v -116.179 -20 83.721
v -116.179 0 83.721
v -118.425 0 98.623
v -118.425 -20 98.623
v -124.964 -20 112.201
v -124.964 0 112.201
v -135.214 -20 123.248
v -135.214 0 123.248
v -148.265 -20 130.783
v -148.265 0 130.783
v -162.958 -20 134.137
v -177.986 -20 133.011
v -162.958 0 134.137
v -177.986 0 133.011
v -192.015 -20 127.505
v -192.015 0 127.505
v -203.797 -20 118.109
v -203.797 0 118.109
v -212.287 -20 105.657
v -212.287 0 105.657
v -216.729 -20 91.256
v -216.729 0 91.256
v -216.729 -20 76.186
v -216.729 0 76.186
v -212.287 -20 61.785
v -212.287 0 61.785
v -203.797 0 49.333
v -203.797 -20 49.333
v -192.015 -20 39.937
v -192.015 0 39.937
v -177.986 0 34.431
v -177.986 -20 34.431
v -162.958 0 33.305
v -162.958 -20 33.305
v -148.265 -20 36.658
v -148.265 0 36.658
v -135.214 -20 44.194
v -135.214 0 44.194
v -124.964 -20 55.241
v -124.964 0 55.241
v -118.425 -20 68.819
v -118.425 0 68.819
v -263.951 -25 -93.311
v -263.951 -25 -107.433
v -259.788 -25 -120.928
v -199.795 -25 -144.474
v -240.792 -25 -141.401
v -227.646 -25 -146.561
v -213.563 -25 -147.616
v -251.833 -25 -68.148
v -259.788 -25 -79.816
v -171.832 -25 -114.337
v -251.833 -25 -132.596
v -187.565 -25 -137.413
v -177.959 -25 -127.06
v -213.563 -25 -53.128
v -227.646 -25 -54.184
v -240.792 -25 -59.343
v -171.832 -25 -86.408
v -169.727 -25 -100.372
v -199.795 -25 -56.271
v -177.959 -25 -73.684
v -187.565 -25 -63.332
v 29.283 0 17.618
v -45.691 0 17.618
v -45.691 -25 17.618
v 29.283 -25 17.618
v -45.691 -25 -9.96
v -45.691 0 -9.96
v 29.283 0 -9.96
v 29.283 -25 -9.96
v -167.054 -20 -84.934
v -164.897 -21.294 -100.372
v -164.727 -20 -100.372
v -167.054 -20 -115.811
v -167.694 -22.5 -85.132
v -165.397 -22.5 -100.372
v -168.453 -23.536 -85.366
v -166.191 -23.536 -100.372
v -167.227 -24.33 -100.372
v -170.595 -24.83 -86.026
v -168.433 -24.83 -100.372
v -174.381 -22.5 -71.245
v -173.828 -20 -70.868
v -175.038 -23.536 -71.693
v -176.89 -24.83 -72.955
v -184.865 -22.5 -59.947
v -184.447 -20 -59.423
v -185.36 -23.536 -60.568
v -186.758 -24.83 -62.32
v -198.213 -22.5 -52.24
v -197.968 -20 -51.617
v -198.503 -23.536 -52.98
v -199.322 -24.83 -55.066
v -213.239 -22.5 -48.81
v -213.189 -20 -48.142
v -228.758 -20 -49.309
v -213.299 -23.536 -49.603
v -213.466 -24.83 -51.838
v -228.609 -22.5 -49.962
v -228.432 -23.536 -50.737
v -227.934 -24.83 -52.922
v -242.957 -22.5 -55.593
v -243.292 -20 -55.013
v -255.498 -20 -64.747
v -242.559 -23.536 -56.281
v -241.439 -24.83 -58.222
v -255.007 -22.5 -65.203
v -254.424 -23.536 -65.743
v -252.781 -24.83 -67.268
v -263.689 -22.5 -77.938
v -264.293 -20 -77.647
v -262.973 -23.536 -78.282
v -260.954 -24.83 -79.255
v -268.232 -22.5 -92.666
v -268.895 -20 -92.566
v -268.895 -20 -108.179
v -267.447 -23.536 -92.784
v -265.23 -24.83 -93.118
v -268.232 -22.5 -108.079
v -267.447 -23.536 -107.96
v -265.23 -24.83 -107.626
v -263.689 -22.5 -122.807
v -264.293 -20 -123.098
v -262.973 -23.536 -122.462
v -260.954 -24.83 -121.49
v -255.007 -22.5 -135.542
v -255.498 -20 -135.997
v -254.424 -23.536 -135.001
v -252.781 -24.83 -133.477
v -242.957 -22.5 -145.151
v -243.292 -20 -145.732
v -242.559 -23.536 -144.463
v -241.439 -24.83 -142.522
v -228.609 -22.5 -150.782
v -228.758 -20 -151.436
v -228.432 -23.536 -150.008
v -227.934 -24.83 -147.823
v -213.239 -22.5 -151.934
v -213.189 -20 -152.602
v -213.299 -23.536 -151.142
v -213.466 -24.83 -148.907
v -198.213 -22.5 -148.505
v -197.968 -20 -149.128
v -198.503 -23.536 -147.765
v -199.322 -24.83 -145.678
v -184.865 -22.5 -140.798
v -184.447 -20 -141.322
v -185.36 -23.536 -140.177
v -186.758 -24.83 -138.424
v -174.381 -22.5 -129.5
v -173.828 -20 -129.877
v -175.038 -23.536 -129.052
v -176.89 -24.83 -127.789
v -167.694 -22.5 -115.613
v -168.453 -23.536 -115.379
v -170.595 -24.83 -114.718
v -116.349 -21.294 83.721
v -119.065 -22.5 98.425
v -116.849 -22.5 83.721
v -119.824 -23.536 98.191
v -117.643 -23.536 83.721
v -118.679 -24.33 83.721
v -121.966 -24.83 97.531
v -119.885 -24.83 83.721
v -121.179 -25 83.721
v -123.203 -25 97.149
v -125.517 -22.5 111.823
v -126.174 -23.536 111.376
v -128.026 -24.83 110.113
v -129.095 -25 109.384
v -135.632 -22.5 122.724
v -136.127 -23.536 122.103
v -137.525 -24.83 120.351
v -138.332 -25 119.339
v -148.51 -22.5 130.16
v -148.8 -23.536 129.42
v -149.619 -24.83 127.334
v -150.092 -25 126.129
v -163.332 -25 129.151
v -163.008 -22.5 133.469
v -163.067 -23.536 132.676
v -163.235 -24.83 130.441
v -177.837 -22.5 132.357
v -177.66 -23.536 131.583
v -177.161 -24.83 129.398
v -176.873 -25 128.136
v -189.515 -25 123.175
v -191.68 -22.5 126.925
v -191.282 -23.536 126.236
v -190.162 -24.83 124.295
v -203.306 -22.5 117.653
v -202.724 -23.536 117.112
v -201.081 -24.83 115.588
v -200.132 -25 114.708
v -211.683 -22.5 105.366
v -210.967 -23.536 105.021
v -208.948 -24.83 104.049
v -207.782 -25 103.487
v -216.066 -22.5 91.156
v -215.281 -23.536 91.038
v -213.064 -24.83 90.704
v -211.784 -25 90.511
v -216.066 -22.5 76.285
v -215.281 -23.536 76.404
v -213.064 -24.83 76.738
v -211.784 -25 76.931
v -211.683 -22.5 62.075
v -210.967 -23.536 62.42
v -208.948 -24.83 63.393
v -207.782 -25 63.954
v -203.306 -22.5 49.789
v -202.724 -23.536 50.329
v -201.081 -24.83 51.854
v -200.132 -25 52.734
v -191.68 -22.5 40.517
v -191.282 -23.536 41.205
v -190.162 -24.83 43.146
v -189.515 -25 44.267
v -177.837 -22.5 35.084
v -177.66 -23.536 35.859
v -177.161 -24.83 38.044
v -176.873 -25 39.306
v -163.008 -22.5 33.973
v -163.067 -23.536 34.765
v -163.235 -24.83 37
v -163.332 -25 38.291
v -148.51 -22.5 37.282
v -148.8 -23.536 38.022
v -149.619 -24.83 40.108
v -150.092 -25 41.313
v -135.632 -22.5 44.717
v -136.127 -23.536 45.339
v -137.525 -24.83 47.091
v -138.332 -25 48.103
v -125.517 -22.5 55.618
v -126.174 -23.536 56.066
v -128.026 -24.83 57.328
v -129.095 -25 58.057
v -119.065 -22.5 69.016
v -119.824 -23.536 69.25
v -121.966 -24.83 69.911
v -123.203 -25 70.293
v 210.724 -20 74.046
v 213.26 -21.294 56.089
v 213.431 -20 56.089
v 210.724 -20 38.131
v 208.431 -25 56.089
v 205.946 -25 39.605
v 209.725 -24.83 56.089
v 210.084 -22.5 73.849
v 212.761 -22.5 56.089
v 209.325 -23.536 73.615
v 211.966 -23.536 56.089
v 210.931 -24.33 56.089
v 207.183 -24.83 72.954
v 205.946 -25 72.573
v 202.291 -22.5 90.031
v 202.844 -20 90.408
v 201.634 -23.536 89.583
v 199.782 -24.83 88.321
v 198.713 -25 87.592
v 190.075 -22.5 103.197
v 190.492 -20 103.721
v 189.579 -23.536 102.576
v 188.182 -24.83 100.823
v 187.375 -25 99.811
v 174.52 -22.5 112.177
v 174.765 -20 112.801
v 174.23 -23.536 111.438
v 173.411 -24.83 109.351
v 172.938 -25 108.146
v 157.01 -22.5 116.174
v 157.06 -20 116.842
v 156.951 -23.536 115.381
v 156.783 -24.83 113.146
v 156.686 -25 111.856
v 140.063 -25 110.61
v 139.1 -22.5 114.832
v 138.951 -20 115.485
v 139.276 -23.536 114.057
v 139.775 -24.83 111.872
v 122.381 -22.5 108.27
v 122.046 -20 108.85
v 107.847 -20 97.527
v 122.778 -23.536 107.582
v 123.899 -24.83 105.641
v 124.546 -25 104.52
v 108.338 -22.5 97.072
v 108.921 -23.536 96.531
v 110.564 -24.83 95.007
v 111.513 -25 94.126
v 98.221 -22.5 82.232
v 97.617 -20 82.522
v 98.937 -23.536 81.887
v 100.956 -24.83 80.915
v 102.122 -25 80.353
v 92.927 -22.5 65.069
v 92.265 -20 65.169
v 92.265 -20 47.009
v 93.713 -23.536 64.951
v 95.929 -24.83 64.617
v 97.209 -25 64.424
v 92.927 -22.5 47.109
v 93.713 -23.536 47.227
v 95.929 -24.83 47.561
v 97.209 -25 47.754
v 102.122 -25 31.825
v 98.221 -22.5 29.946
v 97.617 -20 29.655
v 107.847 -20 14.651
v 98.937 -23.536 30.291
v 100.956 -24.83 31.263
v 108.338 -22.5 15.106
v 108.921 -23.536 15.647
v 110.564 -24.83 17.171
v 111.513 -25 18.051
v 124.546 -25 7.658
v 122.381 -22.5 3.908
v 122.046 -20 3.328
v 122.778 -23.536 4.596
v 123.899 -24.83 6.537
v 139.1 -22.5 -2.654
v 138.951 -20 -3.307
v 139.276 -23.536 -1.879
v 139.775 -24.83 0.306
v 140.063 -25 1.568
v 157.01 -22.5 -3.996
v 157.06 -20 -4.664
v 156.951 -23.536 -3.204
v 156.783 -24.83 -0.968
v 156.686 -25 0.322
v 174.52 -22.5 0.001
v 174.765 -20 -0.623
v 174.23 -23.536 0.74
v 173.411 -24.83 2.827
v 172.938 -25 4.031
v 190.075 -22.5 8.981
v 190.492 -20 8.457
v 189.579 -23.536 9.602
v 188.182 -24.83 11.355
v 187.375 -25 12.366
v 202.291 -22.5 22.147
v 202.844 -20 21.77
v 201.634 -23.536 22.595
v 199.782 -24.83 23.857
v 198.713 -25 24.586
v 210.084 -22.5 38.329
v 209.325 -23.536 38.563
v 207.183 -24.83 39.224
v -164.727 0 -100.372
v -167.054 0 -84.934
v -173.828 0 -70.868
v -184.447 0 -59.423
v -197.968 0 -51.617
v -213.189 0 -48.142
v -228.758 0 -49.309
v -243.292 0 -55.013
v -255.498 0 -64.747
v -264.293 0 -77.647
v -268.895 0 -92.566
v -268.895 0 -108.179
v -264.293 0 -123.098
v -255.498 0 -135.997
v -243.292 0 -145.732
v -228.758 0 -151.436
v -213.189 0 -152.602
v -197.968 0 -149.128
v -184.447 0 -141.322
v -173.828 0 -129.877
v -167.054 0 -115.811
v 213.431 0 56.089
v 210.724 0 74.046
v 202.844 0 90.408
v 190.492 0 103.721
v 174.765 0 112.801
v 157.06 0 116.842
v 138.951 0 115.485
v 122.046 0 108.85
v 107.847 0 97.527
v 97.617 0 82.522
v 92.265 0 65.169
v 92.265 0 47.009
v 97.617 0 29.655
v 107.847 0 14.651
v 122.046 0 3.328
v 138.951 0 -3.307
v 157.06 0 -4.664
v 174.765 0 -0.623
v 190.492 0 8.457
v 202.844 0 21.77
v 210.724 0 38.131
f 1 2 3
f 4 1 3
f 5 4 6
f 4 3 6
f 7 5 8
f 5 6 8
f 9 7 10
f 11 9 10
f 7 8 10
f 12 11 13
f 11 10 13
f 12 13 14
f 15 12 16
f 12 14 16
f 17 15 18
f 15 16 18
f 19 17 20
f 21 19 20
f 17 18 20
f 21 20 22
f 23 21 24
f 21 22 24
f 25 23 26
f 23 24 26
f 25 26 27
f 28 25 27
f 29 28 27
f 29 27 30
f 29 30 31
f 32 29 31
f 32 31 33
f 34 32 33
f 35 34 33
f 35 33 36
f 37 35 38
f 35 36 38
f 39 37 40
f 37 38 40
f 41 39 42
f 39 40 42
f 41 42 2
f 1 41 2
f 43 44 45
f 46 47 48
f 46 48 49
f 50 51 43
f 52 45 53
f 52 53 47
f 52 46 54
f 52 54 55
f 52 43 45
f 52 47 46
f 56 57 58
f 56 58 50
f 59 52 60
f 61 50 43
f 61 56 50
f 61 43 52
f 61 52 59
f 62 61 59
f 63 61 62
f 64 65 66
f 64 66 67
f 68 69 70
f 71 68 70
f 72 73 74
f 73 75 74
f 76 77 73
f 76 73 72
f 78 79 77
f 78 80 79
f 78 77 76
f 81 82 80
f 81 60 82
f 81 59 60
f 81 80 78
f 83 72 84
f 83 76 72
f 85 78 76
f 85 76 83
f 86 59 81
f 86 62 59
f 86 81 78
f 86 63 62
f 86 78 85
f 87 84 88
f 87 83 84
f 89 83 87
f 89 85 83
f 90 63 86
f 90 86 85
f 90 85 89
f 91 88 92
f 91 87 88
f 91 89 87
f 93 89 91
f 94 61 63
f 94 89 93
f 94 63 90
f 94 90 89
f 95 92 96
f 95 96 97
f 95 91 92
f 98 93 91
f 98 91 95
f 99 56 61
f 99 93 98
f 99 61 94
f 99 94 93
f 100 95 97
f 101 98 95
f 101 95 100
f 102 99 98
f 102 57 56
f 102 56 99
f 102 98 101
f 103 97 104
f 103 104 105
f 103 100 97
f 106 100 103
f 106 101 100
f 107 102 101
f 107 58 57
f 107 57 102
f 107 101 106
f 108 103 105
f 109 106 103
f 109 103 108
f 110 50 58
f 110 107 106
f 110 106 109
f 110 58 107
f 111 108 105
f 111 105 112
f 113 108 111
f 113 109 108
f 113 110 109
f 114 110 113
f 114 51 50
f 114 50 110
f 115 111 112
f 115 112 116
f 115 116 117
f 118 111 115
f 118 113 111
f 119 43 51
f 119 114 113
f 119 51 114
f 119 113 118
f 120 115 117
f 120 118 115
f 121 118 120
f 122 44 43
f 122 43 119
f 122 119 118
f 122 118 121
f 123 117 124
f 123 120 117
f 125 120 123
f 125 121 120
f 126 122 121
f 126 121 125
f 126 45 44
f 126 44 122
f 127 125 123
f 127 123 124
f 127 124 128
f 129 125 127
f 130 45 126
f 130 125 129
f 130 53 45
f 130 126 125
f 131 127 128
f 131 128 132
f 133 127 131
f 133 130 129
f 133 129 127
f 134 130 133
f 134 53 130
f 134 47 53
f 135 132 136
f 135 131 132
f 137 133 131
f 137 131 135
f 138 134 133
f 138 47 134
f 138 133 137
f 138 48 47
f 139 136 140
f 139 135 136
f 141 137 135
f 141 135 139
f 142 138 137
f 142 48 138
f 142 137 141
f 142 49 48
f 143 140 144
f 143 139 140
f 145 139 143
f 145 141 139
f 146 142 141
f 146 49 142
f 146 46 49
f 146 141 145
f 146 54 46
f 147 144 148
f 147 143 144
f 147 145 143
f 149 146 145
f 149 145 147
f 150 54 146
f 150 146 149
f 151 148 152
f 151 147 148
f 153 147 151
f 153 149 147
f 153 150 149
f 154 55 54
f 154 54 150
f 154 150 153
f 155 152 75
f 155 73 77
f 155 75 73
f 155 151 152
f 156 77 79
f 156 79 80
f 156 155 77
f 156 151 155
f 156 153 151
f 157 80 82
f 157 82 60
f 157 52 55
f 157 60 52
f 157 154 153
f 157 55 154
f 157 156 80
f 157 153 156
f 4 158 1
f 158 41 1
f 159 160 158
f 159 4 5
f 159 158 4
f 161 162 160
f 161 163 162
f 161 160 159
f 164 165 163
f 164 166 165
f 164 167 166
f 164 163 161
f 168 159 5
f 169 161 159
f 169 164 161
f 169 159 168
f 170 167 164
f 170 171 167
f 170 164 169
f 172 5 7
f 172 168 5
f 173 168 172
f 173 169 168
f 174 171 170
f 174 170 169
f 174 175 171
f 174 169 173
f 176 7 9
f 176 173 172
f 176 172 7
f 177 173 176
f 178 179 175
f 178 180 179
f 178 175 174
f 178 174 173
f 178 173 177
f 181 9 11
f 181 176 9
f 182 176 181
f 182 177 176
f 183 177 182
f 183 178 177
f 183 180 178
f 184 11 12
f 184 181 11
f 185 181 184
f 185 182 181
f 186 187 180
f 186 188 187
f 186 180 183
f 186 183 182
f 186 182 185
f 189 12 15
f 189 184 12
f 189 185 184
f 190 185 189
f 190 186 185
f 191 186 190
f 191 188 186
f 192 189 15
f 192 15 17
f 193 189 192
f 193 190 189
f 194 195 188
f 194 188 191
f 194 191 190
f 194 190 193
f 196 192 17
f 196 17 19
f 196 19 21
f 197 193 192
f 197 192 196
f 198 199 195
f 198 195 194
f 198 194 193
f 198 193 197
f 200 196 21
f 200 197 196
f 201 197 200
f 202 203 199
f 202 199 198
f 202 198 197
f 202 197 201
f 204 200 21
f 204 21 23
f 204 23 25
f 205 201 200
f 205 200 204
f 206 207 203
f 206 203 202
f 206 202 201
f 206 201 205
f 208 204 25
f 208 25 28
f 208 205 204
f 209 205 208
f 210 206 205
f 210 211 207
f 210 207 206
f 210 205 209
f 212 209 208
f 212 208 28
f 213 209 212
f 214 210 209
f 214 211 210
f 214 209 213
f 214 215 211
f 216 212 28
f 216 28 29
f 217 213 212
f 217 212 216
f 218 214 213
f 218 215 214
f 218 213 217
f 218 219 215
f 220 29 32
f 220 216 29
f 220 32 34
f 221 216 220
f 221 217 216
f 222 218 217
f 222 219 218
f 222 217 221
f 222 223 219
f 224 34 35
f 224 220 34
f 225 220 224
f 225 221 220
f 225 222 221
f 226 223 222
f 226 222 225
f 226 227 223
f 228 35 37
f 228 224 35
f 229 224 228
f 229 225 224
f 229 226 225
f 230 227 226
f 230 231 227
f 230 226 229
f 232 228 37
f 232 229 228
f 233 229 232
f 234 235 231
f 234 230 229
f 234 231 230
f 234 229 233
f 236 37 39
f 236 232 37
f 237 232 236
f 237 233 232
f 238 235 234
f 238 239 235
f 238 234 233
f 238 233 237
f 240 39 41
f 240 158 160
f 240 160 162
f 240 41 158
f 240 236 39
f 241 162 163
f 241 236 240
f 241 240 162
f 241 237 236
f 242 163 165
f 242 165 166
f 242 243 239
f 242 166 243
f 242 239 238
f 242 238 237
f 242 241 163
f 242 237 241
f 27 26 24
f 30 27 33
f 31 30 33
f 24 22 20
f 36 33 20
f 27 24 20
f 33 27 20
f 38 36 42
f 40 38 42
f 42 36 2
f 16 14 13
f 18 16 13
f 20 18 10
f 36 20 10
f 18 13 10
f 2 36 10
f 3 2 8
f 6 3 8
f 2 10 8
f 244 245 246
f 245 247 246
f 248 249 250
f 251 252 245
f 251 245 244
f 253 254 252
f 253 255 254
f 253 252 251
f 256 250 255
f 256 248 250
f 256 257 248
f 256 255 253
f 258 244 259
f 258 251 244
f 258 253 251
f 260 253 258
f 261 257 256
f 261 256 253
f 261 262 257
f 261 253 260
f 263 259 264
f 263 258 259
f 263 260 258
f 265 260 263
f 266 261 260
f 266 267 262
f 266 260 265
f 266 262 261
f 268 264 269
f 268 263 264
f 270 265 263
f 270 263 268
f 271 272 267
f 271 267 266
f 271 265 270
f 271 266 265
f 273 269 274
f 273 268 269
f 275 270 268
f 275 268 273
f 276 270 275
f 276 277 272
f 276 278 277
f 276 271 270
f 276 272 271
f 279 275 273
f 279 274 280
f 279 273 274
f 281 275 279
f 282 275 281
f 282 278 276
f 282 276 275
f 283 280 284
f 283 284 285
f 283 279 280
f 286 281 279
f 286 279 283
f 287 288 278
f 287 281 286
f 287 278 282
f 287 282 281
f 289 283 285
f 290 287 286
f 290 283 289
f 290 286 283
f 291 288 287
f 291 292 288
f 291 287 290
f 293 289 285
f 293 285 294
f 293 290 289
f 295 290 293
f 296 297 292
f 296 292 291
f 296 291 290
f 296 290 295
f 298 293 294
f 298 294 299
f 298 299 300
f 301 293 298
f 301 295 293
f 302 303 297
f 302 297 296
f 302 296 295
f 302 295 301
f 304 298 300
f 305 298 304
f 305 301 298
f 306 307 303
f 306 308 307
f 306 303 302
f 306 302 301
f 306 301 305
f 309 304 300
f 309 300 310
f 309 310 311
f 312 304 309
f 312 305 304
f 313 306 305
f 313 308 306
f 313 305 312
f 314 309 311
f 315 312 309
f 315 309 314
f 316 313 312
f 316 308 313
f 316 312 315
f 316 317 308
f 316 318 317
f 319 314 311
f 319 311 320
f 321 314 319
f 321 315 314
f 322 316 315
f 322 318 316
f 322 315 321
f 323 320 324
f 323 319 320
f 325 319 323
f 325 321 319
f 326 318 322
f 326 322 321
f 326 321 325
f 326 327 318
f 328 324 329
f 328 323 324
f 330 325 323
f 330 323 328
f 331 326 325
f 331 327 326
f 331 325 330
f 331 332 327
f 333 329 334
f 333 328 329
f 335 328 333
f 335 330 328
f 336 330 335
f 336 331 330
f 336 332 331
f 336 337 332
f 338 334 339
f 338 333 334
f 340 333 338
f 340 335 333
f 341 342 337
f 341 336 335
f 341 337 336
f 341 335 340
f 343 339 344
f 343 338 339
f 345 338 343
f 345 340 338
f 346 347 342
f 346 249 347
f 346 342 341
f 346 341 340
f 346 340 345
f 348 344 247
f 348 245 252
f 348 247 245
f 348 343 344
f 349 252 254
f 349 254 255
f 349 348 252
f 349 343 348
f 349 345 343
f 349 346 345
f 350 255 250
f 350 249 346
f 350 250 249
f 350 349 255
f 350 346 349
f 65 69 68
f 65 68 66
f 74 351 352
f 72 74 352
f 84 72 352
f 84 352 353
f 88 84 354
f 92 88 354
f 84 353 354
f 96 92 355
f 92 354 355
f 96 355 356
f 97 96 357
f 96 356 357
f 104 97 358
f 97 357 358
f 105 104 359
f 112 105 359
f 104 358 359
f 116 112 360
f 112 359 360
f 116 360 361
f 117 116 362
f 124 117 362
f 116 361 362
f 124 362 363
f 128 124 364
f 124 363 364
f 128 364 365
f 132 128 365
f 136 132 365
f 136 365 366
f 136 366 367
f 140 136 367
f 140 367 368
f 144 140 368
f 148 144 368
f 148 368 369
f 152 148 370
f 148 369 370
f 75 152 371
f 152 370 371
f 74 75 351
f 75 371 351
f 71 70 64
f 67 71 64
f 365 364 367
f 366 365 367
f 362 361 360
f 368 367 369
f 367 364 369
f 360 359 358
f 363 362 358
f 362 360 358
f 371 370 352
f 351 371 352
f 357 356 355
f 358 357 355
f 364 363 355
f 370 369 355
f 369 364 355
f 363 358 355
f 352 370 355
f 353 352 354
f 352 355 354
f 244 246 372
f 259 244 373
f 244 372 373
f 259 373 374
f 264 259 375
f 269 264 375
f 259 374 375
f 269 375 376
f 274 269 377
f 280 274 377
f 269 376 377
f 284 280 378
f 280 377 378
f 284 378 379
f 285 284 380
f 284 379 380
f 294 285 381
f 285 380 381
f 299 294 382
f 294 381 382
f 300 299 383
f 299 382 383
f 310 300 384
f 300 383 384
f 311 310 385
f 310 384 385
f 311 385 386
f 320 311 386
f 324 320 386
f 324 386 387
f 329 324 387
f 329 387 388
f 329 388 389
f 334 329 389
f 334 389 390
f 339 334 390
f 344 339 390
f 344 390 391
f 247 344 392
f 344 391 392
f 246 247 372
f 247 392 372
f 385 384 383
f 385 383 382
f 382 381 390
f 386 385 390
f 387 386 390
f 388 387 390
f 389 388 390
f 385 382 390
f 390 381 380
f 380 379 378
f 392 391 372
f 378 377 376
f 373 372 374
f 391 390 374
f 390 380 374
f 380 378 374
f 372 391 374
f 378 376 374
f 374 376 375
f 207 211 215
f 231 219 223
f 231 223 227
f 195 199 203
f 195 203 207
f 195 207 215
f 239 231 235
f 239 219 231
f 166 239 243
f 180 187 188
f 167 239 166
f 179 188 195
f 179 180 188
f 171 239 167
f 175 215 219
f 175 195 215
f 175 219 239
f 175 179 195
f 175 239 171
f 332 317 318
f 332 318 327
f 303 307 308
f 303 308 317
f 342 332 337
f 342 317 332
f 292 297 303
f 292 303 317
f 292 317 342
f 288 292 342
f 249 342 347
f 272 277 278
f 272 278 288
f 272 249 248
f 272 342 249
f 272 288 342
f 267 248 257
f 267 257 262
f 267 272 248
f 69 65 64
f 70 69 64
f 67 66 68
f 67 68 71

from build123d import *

# Parameters (mm, degrees)
F0_W     = 74.973681
F0_H     = 27.578301
F1_DEPTH = 25
F2_R     = 60.923252
F2_R_2   = 50.557279
F2_R_3   = 52.376378
F3_DEPTH = 25
F4_R     = 5


with BuildPart() as f1:
    # F0 (on Front) → F1 (new body)
    with BuildSketch(Plane.XZ):
        with Locations((-8.204144, 3.8287)):
            Rectangle(F0_W, F0_H)
    extrude(amount=F1_DEPTH)


with BuildPart() as f3:
    # F2 (on Front) → F3 (new body)
    with BuildSketch(Plane.XZ):
        with Locations((152.507305, 56.08888)):
            Circle(F2_R)
        with Locations((-166.736037, 83.720818)):
            Circle(F2_R_2)
        with Locations((-217.103332, -100.372329)):
            Circle(F2_R_3)
    extrude(amount=F3_DEPTH)

    # F4
    f4_edges = [f3.edges().sort_by_distance(p)[0] for p in [
        (-269.47971, -25, -100.372329),
        (-217.293315, -25, 83.720818),
        (91.584053, -25, 56.08888),
    ]]
    fillet(f4_edges, radius=F4_R)


solid = Compound([f1.part, f3.part])
